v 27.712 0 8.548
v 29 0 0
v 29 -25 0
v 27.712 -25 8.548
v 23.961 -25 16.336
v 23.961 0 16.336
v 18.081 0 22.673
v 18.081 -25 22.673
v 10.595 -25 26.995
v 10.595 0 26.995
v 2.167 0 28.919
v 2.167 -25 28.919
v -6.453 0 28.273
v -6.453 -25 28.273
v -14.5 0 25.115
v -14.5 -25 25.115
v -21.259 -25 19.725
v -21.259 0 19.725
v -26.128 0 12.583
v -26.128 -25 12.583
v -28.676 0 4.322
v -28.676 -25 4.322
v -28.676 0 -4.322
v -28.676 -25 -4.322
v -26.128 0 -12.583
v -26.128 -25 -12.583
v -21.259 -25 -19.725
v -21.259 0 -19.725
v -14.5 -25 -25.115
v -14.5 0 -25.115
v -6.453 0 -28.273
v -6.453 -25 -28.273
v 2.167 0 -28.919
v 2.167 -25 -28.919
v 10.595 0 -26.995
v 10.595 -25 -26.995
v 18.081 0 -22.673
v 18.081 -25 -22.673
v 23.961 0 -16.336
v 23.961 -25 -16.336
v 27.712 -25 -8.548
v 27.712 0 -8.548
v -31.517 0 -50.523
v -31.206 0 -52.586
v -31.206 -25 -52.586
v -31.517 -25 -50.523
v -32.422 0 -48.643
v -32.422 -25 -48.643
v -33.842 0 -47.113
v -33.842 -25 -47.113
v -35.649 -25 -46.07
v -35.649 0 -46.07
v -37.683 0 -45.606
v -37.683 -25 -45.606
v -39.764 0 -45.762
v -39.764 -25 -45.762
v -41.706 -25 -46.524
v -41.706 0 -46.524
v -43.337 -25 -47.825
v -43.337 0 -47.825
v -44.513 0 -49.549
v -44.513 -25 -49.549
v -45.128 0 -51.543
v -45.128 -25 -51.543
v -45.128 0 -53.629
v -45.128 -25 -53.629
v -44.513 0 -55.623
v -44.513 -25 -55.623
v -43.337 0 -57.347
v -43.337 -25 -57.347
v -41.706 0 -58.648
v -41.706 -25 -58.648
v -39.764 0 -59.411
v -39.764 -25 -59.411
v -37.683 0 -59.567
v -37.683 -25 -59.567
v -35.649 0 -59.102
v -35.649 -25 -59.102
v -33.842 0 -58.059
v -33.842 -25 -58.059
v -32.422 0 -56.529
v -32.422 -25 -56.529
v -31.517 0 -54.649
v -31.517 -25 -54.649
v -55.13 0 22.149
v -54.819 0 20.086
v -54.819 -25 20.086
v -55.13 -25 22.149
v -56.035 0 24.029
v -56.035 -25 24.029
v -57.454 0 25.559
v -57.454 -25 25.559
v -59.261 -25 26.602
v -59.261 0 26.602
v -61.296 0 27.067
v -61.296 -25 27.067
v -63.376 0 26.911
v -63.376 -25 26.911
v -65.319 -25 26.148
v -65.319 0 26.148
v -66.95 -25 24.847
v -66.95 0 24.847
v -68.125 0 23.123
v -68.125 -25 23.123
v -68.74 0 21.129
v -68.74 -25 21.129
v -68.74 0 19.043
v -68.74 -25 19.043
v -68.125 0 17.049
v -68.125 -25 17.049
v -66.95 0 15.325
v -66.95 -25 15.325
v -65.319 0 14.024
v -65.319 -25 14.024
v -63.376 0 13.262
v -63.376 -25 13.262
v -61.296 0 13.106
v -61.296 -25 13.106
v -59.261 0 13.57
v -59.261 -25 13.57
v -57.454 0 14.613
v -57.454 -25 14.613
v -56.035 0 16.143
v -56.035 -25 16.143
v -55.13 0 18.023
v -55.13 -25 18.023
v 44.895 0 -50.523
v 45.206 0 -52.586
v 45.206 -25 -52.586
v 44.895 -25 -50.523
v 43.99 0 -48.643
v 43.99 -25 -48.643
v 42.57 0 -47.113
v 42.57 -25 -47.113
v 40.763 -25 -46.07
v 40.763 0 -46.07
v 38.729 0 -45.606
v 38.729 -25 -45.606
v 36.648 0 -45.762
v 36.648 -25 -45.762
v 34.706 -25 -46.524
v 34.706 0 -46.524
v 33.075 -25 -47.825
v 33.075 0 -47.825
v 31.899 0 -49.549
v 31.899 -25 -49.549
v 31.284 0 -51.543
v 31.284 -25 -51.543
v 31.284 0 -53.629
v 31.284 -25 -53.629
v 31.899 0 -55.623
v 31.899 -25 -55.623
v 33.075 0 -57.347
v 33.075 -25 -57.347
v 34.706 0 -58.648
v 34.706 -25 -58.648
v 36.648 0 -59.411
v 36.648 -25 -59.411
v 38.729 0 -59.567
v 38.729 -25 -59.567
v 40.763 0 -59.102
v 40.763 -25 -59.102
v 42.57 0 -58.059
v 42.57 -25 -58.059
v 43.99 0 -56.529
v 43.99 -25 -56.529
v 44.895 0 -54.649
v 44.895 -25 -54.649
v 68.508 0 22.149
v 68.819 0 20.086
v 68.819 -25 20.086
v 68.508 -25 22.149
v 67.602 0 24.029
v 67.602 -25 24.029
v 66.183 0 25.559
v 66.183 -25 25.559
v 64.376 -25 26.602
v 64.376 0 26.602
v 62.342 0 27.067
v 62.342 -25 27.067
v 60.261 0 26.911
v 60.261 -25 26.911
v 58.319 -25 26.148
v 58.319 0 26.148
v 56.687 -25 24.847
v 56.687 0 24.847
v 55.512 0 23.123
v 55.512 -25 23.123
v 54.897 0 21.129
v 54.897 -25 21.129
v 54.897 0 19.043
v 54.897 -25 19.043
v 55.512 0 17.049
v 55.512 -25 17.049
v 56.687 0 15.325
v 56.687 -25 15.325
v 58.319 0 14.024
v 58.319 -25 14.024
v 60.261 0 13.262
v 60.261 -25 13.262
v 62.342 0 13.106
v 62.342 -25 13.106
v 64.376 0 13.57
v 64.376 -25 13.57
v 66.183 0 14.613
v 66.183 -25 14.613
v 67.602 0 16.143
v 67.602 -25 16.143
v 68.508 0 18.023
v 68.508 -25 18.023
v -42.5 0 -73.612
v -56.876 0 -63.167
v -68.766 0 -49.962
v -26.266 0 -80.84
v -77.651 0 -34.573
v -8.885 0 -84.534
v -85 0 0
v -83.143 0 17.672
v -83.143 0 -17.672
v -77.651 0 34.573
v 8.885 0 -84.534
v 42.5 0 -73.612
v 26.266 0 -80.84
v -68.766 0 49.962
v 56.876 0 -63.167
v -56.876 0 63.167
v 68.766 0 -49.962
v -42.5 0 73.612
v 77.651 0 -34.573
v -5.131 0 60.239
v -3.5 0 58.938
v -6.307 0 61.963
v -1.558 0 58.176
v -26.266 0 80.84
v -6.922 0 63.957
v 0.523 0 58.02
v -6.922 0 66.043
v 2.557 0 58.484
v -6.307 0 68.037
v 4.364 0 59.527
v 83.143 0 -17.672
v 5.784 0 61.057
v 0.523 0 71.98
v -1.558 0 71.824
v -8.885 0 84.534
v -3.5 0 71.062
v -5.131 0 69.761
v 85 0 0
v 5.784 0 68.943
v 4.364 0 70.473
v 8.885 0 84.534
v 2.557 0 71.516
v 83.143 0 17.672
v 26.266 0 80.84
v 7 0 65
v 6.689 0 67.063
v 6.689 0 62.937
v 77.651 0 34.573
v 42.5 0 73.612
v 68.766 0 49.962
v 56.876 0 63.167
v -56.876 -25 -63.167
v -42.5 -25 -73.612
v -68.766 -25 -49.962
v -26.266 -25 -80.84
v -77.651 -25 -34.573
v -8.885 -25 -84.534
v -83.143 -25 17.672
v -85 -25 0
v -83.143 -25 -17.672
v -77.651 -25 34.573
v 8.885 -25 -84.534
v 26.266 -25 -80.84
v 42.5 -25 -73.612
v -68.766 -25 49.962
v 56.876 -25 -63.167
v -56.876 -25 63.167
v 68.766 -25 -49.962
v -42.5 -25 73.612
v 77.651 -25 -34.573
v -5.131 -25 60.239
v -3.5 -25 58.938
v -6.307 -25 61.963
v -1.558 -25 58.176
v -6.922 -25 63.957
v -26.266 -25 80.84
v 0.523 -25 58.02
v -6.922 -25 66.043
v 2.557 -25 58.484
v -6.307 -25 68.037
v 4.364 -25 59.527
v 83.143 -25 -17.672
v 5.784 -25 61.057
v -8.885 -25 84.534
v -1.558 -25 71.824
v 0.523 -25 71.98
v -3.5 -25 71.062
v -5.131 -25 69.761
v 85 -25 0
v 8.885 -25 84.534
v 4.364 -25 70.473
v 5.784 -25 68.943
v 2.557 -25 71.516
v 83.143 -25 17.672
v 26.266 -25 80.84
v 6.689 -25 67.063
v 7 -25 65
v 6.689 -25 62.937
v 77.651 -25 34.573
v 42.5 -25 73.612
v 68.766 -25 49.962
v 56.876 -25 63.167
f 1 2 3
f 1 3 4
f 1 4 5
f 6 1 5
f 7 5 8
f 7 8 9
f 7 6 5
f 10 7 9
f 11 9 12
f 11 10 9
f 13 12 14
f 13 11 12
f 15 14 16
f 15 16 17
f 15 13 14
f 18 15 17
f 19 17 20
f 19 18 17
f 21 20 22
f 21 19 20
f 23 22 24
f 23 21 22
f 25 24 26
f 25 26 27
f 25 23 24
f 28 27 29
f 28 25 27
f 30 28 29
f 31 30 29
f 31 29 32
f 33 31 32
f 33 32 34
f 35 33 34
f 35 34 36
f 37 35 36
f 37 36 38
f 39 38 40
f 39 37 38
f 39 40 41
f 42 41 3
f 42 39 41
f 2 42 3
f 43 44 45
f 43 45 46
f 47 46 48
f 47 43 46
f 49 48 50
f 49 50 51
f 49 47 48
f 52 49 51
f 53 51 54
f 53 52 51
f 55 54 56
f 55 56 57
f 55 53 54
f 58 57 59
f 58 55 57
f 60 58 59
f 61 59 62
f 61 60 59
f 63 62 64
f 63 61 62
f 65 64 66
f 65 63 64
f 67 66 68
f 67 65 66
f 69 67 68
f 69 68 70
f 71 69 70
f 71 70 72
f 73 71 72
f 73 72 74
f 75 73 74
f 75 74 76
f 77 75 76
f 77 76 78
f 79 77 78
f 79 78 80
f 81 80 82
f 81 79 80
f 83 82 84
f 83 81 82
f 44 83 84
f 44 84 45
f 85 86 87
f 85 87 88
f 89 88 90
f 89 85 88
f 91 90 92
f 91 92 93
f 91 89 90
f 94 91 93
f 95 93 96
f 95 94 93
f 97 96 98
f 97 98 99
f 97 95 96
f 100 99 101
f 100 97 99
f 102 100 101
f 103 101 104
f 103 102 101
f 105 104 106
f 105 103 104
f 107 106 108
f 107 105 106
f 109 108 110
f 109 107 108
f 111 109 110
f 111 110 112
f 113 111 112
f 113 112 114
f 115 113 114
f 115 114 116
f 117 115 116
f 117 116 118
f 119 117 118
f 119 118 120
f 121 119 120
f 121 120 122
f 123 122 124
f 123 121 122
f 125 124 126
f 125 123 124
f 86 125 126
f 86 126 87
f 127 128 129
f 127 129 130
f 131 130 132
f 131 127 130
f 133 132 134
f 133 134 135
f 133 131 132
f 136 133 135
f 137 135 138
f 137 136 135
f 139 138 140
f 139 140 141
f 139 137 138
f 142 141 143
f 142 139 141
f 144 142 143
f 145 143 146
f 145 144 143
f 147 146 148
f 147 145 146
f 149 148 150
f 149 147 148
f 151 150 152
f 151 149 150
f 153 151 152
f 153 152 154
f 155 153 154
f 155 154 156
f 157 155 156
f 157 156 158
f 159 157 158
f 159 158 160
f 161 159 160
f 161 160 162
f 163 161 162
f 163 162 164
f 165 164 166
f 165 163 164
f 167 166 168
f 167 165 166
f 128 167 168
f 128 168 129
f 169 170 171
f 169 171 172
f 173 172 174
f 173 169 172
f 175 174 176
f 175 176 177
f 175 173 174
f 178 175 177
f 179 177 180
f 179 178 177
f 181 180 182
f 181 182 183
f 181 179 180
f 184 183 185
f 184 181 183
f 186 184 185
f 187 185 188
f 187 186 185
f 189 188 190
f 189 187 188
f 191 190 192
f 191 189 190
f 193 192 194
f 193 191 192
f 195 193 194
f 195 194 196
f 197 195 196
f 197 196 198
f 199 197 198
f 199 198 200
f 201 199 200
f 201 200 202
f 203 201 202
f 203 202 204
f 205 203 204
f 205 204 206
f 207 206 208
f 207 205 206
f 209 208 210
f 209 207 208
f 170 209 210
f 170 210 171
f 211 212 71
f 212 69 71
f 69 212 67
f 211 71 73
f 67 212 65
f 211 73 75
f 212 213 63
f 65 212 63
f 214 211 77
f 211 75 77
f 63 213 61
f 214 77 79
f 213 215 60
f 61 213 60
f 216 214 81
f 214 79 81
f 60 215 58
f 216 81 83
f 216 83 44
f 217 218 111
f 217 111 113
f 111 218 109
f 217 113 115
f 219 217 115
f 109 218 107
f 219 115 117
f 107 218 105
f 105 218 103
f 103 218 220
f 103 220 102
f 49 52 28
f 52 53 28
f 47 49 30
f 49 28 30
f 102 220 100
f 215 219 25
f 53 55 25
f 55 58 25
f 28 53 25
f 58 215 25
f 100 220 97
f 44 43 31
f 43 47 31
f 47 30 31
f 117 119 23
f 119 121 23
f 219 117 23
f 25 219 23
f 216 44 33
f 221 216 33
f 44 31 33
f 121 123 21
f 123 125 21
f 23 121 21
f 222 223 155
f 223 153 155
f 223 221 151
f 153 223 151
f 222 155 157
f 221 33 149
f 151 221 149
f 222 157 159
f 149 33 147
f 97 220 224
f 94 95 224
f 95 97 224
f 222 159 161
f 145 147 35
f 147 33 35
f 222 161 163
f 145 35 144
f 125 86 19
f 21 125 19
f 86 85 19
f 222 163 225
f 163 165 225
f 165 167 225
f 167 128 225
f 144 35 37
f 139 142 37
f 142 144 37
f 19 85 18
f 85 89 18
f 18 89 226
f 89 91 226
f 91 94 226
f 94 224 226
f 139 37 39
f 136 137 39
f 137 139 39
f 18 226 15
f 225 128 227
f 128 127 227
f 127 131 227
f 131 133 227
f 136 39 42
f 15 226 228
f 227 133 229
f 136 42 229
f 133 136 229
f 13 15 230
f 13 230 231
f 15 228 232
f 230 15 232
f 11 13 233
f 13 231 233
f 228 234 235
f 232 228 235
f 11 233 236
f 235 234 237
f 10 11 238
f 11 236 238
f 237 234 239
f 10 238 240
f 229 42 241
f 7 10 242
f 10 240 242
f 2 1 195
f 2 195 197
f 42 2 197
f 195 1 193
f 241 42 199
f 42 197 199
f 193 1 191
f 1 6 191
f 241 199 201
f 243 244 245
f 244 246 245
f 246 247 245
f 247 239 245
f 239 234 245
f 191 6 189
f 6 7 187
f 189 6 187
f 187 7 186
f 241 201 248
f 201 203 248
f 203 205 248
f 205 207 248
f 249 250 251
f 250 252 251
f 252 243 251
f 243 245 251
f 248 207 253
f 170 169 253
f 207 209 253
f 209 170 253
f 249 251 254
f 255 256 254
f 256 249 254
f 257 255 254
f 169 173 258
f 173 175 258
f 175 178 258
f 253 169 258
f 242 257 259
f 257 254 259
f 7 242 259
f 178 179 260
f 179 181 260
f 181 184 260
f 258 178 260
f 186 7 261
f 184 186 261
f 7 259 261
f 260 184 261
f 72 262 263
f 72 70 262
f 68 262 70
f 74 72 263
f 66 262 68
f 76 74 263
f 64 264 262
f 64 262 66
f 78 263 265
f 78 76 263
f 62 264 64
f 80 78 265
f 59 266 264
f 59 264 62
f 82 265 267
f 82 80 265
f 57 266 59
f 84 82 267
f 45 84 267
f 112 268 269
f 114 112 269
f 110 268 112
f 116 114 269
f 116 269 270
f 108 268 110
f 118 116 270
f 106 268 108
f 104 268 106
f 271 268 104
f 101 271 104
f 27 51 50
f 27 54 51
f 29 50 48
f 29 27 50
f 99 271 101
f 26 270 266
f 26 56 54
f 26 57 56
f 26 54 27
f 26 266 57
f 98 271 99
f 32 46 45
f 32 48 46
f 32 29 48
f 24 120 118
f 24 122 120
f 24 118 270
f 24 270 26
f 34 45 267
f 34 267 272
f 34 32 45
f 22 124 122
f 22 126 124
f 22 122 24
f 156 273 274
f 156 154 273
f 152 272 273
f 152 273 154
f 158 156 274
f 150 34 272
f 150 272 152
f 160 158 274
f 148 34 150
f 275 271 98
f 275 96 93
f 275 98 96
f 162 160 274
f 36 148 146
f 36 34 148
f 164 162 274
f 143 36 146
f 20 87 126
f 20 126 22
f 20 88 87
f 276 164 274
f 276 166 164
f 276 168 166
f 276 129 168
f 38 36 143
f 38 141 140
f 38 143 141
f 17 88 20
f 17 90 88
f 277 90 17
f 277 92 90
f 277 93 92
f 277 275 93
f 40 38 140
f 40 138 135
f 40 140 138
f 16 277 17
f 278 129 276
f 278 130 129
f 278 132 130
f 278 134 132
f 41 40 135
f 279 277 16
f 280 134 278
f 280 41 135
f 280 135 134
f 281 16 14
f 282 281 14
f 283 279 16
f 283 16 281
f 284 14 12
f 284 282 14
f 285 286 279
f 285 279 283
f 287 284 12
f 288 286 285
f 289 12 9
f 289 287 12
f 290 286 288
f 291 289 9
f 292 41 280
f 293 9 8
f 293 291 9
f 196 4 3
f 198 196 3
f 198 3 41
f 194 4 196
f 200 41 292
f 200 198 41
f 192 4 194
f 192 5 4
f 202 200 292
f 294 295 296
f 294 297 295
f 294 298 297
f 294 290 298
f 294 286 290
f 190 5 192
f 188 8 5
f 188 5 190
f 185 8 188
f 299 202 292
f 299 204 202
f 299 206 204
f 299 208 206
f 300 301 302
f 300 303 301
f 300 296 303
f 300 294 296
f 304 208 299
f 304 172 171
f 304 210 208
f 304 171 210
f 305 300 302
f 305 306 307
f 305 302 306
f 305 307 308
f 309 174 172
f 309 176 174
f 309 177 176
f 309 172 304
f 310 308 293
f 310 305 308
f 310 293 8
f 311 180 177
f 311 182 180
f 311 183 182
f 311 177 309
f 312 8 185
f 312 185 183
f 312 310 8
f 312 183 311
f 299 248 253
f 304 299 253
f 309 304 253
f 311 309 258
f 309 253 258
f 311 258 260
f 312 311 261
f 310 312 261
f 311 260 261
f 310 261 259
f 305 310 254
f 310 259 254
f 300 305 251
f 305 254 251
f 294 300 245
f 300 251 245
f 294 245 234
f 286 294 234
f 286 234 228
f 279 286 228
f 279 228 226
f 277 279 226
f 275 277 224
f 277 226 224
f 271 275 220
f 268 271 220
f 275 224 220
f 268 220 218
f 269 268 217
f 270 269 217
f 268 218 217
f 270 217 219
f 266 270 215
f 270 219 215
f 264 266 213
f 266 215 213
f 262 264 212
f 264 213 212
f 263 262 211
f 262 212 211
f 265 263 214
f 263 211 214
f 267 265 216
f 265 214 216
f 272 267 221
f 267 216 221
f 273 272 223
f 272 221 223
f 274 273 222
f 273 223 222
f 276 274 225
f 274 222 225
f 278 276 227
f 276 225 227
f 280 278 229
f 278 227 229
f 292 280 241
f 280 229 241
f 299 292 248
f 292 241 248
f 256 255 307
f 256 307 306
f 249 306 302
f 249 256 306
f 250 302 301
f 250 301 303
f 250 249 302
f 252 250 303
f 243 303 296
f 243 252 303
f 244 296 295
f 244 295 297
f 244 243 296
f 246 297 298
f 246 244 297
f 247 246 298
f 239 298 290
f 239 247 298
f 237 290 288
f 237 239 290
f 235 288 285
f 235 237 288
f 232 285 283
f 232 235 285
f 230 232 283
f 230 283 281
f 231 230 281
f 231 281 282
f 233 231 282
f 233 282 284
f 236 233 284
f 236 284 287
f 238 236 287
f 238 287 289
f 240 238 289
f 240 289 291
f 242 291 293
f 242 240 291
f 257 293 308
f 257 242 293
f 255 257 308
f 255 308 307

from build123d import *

# Parameters (mm, degrees)
F0_R     = 85
F0_R_2   = 7
F0_R_3   = 29
F1_DEPTH = 25


# Not quite as in the source:
# - the program builds the solid bodies; features that only make, move or delete a surface that nothing else refers to are left out


with BuildPart() as f1:
    # F0 (on Front) → F1 (new body)
    with BuildSketch(Plane.XZ):
        Circle(F0_R)
        with Locations((-38.206041399, -52.5861046344)):
            Circle(F0_R_2, mode=Mode.SUBTRACT)
        with Locations((38.206041399, -52.5861046344)):
            Circle(F0_R_2, mode=Mode.SUBTRACT)
        with Locations((-61.8186735592, 20.0861046344)):
            Circle(F0_R_2, mode=Mode.SUBTRACT)
        Circle(F0_R_3, mode=Mode.SUBTRACT)
        with Locations((61.8186735592, 20.0861046344)):
            Circle(F0_R_2, mode=Mode.SUBTRACT)
        with Locations((0, 65)):
            Circle(F0_R_2, mode=Mode.SUBTRACT)
    extrude(amount=F1_DEPTH)


solid = f1.part
